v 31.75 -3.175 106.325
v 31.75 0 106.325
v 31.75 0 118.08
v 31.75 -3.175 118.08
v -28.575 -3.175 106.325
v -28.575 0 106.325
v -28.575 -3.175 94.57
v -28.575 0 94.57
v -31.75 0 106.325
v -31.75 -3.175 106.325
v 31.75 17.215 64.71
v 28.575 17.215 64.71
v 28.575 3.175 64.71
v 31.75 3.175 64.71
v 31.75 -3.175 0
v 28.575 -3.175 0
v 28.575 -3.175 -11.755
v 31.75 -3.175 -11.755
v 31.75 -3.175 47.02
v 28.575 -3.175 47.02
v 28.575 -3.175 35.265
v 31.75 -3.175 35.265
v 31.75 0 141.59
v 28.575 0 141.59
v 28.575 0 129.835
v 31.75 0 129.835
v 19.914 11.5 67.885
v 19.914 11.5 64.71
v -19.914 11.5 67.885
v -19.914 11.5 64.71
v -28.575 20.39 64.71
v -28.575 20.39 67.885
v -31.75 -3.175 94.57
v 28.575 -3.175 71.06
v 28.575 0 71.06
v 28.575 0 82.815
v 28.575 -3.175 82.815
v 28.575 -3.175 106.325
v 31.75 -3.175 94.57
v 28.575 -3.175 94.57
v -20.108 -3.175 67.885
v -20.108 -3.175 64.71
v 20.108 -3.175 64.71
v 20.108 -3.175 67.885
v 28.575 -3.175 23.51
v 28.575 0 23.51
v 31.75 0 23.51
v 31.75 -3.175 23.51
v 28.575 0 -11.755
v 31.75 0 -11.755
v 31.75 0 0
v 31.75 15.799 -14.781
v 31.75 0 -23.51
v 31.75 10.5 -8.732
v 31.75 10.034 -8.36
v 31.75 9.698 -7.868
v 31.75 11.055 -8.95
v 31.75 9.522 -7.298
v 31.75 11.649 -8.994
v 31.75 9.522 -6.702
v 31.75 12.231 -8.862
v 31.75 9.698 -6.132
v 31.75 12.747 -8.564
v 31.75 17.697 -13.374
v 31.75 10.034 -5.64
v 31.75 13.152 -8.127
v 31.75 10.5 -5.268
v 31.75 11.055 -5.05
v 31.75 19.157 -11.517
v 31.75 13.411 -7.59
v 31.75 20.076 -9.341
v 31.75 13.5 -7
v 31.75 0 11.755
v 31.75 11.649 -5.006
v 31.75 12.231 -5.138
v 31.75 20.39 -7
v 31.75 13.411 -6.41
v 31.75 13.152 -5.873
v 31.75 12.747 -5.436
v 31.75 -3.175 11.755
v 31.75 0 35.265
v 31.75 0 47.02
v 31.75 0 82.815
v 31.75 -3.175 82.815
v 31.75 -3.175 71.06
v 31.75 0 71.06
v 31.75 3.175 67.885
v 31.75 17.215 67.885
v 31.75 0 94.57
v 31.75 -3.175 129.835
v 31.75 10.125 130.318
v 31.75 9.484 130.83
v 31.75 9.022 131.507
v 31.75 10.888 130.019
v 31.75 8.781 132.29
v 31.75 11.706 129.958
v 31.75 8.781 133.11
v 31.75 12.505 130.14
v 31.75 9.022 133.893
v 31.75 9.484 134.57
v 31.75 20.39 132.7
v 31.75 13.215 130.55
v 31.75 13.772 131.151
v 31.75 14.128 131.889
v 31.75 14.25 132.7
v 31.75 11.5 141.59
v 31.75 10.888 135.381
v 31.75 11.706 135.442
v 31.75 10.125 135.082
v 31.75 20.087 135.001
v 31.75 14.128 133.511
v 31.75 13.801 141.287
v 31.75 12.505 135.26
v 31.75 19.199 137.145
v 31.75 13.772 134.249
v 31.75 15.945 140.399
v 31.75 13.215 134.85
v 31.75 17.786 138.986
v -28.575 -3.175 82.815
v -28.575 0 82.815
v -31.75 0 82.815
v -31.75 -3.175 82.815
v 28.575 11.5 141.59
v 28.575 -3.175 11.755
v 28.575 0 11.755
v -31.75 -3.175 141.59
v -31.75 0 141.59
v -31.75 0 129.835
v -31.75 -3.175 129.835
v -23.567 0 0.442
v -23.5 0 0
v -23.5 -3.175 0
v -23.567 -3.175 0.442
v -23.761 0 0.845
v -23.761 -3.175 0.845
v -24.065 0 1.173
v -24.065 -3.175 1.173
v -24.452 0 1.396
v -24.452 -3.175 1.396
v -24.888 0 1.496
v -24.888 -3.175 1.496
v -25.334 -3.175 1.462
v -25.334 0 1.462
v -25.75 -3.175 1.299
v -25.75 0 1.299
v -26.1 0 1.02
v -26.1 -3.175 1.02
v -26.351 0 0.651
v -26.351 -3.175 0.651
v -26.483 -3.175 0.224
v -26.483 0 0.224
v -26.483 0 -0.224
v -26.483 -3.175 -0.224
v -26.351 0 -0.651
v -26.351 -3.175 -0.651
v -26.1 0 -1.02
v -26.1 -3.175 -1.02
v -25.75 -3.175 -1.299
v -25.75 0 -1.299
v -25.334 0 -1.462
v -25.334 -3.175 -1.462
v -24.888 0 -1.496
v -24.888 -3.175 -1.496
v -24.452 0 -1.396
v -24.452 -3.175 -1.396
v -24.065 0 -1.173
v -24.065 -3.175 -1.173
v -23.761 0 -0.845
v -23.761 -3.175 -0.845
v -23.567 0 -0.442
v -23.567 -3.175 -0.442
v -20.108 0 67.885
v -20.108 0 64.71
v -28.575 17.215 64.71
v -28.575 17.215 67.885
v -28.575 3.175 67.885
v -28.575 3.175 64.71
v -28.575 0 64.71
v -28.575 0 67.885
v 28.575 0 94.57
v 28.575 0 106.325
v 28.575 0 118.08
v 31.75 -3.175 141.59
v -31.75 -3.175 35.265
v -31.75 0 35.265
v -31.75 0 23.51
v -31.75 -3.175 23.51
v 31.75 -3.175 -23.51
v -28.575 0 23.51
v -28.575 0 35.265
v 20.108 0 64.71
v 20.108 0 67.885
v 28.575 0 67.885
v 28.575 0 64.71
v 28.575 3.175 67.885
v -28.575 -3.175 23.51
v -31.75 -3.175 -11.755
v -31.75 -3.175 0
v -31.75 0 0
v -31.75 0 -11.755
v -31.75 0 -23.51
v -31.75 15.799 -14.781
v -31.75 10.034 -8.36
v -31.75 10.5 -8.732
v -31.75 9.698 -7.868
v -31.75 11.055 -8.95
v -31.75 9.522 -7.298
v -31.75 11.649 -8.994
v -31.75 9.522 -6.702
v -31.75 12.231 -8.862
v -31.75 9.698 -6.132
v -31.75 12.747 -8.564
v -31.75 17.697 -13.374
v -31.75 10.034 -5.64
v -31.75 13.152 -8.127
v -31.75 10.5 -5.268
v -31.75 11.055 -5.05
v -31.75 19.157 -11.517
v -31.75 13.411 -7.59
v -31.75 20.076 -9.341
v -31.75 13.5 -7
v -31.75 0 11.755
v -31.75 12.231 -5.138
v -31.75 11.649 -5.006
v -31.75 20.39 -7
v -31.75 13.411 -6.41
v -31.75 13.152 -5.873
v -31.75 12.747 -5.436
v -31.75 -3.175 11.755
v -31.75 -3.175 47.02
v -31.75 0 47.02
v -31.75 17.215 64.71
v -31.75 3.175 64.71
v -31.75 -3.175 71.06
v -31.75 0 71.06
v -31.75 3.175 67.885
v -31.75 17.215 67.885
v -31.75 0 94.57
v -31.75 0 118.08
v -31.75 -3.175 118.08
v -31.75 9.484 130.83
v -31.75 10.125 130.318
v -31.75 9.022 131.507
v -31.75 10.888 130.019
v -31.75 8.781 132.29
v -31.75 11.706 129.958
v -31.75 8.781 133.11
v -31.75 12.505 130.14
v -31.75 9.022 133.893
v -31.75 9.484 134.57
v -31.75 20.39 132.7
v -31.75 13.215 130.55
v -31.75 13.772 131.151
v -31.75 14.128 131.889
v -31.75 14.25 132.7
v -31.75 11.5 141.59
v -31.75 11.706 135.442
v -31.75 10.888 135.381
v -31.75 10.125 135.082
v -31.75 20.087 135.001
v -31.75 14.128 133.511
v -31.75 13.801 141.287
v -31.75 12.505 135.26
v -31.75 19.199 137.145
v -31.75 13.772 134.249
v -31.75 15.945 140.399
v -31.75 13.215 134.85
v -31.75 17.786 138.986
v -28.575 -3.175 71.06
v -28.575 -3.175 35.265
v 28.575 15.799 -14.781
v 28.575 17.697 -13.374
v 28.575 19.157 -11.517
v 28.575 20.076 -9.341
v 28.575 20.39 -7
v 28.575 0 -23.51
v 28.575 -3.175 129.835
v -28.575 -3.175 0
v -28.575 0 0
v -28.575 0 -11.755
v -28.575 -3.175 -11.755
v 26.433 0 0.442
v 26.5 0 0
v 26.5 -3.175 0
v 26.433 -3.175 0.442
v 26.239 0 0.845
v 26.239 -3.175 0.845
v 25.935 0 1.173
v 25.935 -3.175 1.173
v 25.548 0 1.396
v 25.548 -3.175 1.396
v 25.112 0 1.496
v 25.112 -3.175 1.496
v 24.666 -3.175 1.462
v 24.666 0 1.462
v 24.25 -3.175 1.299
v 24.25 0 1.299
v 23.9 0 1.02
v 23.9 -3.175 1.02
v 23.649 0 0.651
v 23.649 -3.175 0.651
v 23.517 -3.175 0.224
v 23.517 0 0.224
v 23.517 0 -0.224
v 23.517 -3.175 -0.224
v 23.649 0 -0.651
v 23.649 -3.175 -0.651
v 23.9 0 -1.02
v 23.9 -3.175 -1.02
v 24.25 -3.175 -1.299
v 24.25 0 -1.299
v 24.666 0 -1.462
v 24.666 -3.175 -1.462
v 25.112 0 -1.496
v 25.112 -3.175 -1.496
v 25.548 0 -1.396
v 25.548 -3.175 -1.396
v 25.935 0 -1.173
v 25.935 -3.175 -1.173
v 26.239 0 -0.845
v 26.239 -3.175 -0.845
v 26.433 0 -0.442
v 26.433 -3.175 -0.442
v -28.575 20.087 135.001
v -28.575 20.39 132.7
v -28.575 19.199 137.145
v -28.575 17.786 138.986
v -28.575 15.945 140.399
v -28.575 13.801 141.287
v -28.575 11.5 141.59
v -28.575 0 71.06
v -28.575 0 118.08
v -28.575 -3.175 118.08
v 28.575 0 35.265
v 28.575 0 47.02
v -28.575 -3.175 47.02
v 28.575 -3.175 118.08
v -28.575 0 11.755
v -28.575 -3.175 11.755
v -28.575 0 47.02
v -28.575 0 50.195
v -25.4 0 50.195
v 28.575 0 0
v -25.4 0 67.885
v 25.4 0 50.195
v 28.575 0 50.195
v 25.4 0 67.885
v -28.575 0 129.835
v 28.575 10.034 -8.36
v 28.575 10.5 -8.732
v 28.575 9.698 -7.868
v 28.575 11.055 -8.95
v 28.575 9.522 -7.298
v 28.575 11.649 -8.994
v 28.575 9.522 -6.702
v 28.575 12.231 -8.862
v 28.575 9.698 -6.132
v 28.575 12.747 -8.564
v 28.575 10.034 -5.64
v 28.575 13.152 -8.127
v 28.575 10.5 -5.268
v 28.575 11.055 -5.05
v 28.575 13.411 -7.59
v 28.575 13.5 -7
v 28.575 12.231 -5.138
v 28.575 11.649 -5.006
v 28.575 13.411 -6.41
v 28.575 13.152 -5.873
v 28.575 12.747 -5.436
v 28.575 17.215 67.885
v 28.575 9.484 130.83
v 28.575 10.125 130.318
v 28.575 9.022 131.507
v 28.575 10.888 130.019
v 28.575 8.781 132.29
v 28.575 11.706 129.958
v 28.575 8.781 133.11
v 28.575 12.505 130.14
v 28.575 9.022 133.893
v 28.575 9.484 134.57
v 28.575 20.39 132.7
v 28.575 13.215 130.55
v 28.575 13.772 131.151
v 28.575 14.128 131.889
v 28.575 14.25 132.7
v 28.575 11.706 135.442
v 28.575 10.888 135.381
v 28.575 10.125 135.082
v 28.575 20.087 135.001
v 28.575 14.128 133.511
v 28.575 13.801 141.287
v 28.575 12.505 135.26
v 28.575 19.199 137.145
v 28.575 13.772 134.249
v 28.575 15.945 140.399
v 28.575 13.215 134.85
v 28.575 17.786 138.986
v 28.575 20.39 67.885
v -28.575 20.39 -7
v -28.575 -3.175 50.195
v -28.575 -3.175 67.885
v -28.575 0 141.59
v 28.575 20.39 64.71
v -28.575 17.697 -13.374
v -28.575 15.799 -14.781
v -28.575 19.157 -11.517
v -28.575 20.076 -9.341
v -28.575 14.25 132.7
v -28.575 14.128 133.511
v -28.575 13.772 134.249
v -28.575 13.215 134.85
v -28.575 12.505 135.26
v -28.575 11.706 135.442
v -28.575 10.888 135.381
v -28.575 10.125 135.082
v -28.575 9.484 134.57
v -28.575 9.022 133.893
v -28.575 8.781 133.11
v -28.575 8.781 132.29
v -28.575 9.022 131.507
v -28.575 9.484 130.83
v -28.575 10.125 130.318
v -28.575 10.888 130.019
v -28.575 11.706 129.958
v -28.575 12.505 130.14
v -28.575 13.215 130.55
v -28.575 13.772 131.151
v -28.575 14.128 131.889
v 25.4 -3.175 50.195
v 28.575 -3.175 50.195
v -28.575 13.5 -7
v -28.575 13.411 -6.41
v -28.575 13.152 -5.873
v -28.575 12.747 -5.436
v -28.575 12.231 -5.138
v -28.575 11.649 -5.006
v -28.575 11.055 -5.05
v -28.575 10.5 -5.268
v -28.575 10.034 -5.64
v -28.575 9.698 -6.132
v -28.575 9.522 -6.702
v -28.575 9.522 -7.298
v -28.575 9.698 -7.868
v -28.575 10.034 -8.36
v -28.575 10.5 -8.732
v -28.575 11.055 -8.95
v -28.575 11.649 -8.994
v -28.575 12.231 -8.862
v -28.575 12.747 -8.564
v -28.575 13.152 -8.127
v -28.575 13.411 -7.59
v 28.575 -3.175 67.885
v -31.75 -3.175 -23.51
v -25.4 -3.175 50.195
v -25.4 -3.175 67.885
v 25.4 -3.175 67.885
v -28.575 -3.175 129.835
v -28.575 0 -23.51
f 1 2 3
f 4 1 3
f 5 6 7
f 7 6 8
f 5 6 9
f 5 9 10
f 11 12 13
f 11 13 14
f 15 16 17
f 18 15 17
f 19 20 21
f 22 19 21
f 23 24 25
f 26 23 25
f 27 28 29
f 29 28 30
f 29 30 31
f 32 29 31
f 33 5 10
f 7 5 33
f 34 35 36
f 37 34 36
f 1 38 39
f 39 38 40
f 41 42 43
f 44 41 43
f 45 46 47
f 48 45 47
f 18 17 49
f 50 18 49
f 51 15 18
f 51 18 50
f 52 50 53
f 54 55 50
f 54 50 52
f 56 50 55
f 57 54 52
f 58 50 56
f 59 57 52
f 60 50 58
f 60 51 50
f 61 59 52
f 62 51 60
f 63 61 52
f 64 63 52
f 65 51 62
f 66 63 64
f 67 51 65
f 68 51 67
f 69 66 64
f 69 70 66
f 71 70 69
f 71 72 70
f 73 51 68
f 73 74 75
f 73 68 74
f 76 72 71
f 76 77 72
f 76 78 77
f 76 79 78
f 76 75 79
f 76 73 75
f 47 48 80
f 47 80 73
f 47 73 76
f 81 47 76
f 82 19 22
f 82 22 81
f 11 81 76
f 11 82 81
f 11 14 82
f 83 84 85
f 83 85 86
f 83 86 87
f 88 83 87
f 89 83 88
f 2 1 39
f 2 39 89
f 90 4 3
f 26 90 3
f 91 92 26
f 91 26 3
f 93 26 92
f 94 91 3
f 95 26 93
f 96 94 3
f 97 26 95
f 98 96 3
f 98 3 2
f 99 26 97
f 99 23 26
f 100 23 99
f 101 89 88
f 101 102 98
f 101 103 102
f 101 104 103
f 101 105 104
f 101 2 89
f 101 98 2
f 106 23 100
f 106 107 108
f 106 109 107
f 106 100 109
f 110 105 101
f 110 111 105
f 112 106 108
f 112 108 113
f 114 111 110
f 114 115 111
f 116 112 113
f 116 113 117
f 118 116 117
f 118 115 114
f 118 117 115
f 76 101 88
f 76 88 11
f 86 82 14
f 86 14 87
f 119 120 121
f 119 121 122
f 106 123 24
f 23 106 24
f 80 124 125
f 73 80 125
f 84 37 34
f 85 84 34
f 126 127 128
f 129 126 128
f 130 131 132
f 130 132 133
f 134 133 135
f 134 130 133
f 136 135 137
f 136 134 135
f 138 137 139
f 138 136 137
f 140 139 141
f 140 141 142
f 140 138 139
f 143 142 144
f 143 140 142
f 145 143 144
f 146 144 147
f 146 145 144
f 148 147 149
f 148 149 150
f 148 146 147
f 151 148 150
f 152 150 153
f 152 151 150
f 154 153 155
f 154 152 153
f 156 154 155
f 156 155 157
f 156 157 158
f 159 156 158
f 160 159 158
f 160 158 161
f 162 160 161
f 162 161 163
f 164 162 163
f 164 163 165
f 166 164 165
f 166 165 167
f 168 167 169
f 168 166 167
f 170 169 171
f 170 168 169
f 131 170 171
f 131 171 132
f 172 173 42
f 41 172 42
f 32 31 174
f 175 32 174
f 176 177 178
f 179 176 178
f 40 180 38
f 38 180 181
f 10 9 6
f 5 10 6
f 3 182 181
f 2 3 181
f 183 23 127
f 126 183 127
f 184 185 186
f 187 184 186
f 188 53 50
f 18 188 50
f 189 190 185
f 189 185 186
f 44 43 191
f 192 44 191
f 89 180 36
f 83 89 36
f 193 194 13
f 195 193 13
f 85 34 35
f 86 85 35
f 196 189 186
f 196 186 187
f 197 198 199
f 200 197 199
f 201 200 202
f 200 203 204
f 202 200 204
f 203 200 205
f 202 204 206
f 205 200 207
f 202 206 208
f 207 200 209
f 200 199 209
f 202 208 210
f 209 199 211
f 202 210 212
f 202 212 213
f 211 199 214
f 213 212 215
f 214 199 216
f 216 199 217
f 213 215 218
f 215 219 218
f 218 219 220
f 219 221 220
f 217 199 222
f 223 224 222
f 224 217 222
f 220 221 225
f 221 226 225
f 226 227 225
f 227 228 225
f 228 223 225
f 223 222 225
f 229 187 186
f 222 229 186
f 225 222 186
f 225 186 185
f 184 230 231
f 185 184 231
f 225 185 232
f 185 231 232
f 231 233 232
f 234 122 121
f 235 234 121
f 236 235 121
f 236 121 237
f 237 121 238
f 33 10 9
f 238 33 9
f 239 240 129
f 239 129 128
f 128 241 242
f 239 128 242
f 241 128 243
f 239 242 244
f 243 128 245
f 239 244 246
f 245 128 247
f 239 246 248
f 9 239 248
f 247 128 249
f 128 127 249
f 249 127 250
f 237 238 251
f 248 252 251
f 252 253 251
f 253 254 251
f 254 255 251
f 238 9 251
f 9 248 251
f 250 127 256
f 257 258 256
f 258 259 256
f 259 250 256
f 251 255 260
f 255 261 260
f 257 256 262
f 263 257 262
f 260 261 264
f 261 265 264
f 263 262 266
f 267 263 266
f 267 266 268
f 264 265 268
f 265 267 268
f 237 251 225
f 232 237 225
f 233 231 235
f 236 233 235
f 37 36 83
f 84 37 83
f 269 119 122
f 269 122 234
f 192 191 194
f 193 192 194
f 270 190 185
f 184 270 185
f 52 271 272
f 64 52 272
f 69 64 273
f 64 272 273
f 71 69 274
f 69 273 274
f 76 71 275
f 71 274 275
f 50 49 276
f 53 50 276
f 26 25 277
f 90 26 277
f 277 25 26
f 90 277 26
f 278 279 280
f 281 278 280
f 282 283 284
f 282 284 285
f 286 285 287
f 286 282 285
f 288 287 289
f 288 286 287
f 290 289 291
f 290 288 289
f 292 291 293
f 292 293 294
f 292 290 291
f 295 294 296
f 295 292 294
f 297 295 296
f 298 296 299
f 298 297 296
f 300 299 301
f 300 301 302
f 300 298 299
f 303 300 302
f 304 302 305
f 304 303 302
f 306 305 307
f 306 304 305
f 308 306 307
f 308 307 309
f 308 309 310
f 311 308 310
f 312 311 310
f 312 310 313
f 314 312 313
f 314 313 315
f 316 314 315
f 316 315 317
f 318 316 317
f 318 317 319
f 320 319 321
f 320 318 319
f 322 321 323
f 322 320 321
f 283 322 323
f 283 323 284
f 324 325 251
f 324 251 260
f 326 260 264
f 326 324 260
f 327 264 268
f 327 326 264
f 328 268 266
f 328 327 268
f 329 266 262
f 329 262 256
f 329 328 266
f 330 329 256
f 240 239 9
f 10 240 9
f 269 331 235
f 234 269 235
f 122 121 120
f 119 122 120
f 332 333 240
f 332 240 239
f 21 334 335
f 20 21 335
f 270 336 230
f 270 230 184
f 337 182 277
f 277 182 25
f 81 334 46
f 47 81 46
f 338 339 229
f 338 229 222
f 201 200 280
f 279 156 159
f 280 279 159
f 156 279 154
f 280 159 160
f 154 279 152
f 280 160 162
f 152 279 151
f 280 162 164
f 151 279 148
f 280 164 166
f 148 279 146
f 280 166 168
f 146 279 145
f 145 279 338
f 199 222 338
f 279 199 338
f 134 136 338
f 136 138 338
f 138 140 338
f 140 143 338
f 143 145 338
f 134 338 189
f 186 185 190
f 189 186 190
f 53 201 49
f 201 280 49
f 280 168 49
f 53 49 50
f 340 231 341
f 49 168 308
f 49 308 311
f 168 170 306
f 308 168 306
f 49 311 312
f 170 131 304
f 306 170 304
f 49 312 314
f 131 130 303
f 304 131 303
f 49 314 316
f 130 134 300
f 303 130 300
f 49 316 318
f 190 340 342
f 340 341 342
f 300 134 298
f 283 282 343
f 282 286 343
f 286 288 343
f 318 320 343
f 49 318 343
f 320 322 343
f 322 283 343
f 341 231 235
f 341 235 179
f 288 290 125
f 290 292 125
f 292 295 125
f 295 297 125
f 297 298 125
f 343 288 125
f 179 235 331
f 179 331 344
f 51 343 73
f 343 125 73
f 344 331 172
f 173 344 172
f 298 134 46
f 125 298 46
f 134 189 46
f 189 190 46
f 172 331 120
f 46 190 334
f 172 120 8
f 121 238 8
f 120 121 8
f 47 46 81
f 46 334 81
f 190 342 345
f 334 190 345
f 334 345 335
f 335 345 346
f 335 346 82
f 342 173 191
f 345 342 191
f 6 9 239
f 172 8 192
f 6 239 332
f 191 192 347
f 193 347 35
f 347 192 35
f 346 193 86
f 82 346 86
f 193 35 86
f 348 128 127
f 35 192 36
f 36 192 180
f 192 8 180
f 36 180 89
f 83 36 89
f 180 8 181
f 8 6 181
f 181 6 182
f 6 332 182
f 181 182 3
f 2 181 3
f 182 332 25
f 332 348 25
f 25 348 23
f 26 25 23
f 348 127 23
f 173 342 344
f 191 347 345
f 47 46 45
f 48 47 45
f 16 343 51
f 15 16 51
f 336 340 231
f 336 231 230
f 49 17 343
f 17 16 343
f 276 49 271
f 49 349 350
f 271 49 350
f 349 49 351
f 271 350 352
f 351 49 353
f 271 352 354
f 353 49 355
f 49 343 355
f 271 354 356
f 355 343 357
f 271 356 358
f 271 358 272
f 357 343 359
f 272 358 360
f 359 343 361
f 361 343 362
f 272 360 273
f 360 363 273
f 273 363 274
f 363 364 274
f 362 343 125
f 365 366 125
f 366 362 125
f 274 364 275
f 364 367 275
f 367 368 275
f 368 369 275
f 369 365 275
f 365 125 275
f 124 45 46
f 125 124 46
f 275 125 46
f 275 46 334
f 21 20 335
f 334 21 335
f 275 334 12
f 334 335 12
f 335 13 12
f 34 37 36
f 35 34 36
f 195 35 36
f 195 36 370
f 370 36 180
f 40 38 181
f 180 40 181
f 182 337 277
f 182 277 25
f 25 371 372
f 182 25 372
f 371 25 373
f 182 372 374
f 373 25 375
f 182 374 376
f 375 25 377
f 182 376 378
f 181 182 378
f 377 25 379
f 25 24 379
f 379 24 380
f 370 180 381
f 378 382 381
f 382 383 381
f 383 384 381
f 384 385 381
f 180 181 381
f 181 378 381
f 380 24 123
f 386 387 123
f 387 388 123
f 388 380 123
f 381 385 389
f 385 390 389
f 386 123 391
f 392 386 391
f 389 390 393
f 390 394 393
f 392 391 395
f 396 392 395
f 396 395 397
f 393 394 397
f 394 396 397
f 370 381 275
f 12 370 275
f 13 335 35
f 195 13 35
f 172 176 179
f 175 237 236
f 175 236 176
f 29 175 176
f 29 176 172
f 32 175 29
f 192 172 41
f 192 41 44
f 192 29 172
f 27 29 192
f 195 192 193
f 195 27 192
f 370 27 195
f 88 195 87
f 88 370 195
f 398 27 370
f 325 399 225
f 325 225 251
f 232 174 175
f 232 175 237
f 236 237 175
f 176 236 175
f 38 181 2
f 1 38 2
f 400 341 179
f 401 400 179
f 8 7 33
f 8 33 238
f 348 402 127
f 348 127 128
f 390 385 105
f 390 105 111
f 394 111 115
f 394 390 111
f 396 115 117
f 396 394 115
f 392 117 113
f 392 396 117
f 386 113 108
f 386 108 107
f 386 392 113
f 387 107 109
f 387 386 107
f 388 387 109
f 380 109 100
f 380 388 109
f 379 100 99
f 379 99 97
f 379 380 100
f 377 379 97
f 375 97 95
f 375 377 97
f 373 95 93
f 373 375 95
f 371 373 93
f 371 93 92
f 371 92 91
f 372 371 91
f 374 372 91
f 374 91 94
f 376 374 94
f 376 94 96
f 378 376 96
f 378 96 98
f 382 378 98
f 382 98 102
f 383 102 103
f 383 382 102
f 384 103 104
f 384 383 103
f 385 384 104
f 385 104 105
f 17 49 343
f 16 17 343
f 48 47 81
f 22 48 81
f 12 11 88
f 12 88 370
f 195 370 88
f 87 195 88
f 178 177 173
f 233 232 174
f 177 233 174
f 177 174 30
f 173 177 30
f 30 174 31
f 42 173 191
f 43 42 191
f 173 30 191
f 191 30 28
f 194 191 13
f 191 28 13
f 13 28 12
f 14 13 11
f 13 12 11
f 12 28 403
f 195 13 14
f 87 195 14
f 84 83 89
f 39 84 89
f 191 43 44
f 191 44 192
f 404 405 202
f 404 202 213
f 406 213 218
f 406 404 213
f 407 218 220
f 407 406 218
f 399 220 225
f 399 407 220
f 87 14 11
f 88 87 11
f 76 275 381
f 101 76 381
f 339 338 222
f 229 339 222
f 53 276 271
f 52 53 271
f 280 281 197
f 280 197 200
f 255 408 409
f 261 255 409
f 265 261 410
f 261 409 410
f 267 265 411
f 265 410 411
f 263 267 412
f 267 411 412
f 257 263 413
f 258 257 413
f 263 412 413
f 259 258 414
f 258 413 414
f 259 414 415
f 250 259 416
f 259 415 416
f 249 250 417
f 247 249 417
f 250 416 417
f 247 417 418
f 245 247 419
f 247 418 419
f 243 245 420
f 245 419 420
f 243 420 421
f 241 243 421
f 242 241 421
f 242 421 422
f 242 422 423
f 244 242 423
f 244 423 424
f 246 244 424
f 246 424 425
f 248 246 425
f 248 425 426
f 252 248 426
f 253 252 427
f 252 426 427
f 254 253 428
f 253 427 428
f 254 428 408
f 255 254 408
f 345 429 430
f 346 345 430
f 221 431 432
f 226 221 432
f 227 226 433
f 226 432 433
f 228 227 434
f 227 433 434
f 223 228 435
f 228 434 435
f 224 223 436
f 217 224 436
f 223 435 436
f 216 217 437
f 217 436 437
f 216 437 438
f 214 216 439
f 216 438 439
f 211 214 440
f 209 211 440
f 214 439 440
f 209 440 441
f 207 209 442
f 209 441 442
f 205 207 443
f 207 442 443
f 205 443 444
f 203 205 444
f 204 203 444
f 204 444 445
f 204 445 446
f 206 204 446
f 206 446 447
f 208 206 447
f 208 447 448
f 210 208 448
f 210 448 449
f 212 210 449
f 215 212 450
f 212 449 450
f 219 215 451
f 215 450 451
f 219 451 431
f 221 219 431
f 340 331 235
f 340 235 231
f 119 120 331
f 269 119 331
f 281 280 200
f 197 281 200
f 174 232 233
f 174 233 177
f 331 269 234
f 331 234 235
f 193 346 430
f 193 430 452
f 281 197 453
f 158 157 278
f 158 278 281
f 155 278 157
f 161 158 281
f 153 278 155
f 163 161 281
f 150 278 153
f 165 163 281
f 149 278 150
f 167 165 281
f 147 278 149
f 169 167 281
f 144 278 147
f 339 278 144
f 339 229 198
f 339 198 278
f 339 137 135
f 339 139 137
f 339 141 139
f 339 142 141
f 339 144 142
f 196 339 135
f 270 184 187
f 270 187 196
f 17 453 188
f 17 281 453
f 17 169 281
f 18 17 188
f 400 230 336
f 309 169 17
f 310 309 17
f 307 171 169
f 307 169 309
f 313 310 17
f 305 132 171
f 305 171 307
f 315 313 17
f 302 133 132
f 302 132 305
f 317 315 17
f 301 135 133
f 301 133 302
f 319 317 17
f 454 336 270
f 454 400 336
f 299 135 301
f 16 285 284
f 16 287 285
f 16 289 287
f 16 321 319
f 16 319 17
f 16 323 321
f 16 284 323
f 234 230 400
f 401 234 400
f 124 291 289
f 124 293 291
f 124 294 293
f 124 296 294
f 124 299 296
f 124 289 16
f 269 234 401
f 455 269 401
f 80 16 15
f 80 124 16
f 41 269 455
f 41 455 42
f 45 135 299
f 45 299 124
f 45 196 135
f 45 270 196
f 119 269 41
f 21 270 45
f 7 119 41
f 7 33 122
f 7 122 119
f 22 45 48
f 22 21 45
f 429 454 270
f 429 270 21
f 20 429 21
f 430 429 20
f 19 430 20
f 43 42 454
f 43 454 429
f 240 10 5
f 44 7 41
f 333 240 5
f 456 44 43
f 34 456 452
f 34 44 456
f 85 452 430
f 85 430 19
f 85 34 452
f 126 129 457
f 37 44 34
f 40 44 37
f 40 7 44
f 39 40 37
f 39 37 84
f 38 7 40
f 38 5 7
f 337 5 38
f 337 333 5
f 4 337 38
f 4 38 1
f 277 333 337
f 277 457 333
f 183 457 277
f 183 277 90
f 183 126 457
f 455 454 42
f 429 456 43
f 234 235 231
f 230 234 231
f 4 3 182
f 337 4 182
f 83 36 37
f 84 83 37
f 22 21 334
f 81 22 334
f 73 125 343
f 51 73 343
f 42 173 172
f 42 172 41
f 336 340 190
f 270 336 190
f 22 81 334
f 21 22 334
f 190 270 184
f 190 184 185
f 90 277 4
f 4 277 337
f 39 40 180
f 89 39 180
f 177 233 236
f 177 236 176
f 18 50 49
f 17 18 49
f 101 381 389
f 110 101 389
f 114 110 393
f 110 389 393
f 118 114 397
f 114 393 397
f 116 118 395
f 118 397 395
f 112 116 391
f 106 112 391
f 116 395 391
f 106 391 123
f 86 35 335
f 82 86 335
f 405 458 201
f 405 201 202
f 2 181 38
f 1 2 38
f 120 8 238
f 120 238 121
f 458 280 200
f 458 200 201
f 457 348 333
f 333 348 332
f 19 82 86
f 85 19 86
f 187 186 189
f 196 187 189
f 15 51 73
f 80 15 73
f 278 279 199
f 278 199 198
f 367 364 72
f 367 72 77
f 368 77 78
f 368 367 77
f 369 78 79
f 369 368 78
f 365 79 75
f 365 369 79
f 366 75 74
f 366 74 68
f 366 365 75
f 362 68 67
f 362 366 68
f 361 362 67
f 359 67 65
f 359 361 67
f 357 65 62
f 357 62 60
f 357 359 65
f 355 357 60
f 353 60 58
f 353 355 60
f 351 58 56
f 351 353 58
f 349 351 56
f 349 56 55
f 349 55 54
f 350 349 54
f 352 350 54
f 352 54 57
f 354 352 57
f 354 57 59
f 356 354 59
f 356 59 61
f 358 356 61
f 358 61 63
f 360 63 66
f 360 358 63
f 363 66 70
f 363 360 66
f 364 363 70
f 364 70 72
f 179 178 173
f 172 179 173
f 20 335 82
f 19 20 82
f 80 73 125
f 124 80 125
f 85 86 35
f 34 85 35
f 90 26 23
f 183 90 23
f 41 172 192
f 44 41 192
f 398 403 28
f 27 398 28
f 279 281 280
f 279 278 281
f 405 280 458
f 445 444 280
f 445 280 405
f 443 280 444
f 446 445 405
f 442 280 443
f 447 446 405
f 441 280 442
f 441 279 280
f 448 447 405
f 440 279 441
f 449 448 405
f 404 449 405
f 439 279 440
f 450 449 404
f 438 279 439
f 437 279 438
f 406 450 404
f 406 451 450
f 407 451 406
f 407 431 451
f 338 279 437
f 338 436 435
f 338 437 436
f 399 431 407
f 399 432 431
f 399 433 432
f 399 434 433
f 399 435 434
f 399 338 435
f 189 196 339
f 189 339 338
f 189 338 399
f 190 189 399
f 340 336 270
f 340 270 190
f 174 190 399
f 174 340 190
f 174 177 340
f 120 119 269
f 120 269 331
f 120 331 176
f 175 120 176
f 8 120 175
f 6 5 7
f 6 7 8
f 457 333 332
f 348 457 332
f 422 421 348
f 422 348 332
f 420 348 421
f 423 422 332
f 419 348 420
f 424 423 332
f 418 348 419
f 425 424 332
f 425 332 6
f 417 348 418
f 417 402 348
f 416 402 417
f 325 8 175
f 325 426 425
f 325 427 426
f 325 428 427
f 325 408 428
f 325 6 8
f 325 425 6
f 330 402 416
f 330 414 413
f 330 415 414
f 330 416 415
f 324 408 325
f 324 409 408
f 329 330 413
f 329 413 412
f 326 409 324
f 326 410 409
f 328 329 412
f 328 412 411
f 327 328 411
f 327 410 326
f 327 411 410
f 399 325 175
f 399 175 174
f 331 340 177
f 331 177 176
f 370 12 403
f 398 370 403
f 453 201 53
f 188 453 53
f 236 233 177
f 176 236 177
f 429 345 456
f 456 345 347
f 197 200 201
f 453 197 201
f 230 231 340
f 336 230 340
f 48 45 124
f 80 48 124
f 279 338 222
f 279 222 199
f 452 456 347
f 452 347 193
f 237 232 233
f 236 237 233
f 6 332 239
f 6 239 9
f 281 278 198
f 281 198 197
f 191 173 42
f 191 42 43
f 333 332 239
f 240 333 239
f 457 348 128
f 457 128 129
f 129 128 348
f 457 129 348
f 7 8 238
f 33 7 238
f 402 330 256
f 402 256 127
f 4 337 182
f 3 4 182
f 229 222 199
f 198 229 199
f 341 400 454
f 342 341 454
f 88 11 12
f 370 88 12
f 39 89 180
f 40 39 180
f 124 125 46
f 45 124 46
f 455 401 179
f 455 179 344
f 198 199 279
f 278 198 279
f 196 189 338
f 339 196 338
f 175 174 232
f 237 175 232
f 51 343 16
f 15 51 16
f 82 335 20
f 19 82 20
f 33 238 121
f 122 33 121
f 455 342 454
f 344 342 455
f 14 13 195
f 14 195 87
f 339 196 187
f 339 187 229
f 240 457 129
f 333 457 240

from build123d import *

# Parameters (mm, degrees)
F3_R      = 1.5
F3_W      = 3.175
F3_H      = 17.69
F4_DEPTH  = 3.175
F6_START  = 28.575
F5_R      = 2
F5_R_2    = 2.75
F6_DEPTH  = 3.175
F9_START  = 64.71
F9_DEPTH  = 3.175
F10_START = 64.71
F10_DEPTH = 3.175


# Not quite as in the source:
# - a variable given as a bare number and used for a length is read in inches; the dataset says mm whatever the document's units were


with BuildPart() as f4:
    # F3 (on Front) → F4 (new body)
    with BuildSketch(Plane.XZ):
        Polygon((-31.75, -23.51), (0, -23.51), (31.75, -23.51), (31.75, -11.755), (28.575, -11.755), (28.575, 0), (31.75, 0), (31.75, 11.755), (28.575, 11.755), (28.575, 23.51), (31.75, 23.51), (31.75, 35.265), (28.575, 35.265), (28.575, 47.02), (31.75, 47.02), (31.75, 59.04), (31.75, 71.06), (28.575, 71.06), (28.575, 82.815), (31.75, 82.815), (31.75, 94.57), (28.575, 94.57), (28.575, 106.325), (31.75, 106.325), (31.75, 118.08), (28.575, 118.08), (28.575, 129.835), (31.75, 129.835), (31.75, 141.59), (0, 141.59), (-31.75, 141.59), (-31.75, 129.835), (-28.575, 129.835), (-28.575, 118.08), (-31.75, 118.08), (-31.75, 106.325), (-28.575, 106.325), (-28.575, 94.57), (-31.75, 94.57), (-31.75, 82.815), (-28.575, 82.815), (-28.575, 71.06), (-31.75, 71.06), (-31.75, 59.04), (-31.75, 47.02), (-28.575, 47.02), (-28.575, 35.265), (-31.75, 35.265), (-31.75, 23.51), (-28.575, 23.51), (-28.575, 11.755), (-31.75, 11.755), (-31.75, 0), (-28.575, 0), (-28.575, -11.755), (-31.75, -11.755), align=None)
        with Locations((-25, 0)):
            Circle(F3_R, mode=Mode.SUBTRACT)
        with Locations((-26.9875, 59.04)):
            Rectangle(F3_W, F3_H, mode=Mode.SUBTRACT)
        with Locations((25, 0)):
            Circle(F3_R, mode=Mode.SUBTRACT)
        with Locations((26.9875, 59.04)):
            Rectangle(F3_W, F3_H, mode=Mode.SUBTRACT)
    extrude(amount=F4_DEPTH)


with BuildPart() as f6:
    # F5 (on Right) → F6 (new body)
    with BuildSketch(Plane.YZ.offset(F6_START)):
        with BuildLine():
            Line((0, -11.755), (0, -23.51))
            Line((0, -23.51), (15.7990416202, -14.7814099717))
            ThreePointArc((15.7990416202, -14.7814099717), (19.1567153533, -11.5173897328), (20.39, -7))
            Line((20.39, -7), (20.39, 132.7))
            ThreePointArc((20.39, 132.7), (17.7861792847, 138.9861792847), (11.5, 141.59))
            Line((11.5, 141.59), (1.9673842471, 141.59))
            Line((1.9673842471, 141.59), (0, 141.59))
            Line((0, 141.59), (0, 129.835))
            Line((0, 129.835), (-3.175, 129.835))
            Line((-3.175, 129.835), (-3.175, 118.08))
            Line((-3.175, 118.08), (0, 118.08))
            Line((0, 118.08), (0, 106.325))
            Line((0, 106.325), (-3.175, 106.325))
            Line((-3.175, 106.325), (-3.175, 94.57))
            Line((-3.175, 94.57), (0, 94.57))
            Line((0, 94.57), (0, 82.815))
            Line((0, 82.815), (-3.175, 82.815))
            Line((-3.175, 82.815), (-3.175, 71.06))
            Line((-3.175, 71.06), (0, 71.06))
            Line((0, 71.06), (0, 59.04))
            Line((0, 59.04), (0, 47.02))
            Line((0, 47.02), (-3.175, 47.02))
            Line((-3.175, 47.02), (-3.175, 35.265))
            Line((-3.175, 35.265), (0, 35.265))
            Line((0, 35.265), (0, 23.51))
            Line((0, 23.51), (-3.175, 23.51))
            Line((-3.175, 23.51), (-3.175, 11.755))
            Line((-3.175, 11.755), (0, 11.755))
            Line((0, 11.755), (0, 0))
            Line((0, 0), (-3.175, 0))
            Line((-3.175, 0), (-3.175, -11.755))
            Line((-3.175, -11.755), (0, -11.755))
        make_face()
        with Locations((11.5, -7)):
            Circle(F5_R, mode=Mode.SUBTRACT)
        with Locations((11.5, 132.7)):
            Circle(F5_R_2, mode=Mode.SUBTRACT)
    extrude(amount=F6_DEPTH)


with BuildPart() as f7_1:
    # F7: instance of F6
    add(f6.part.mirror(Plane.YZ))


with BuildPart() as f9_tool:
    # F8 (on Top) → F9 (new body)
    with BuildSketch(Plane.XY.offset(F9_START)):
        Polygon((19.9135281146, 11.5), (0, 11.5), (-19.9135281146, 11.5), (-28.575, 20.39), (-28.575, 17.215), (-31.75, 17.215), (-31.75, 3.175), (-28.575, 3.175), (-28.575, 0), (-20.1083333333, 0), (-20.1083333333, -3.175), (0, -3.175), (20.1083333333, -3.175), (20.1083333333, 0), (28.575, 0), (28.575, 3.175), (31.75, 3.175), (31.75, 17.215), (28.575, 17.215), (28.575, 20.39), align=None)
    extrude(amount=F9_DEPTH)


with BuildPart() as f4_1:
    add(f4.part)

    # F9: cut by f9_tool
    add(f9_tool.part, mode=Mode.SUBTRACT)


with BuildPart() as f6_1:
    add(f6.part)

    # F9: cut by f9_tool
    add(f9_tool.part, mode=Mode.SUBTRACT)


with BuildPart() as f7_1_1:
    add(f7_1.part)

    # F9: cut by f9_tool
    add(f9_tool.part, mode=Mode.SUBTRACT)


with BuildPart() as f10:
    # F8 (on Top) → F10 (new body)
    with BuildSketch(Plane.XY.offset(F10_START)):
        Polygon((19.9135281146, 11.5), (0, 11.5), (-19.9135281146, 11.5), (-28.575, 20.39), (-28.575, 17.215), (-31.75, 17.215), (-31.75, 3.175), (-28.575, 3.175), (-28.575, 0), (-20.1083333333, 0), (-20.1083333333, -3.175), (0, -3.175), (20.1083333333, -3.175), (20.1083333333, 0), (28.575, 0), (28.575, 3.175), (31.75, 3.175), (31.75, 17.215), (28.575, 17.215), (28.575, 20.39), align=None)
    extrude(amount=F10_DEPTH)


solid = Compound([f4_1.part, f6_1.part, f7_1_1.part, f10.part])
